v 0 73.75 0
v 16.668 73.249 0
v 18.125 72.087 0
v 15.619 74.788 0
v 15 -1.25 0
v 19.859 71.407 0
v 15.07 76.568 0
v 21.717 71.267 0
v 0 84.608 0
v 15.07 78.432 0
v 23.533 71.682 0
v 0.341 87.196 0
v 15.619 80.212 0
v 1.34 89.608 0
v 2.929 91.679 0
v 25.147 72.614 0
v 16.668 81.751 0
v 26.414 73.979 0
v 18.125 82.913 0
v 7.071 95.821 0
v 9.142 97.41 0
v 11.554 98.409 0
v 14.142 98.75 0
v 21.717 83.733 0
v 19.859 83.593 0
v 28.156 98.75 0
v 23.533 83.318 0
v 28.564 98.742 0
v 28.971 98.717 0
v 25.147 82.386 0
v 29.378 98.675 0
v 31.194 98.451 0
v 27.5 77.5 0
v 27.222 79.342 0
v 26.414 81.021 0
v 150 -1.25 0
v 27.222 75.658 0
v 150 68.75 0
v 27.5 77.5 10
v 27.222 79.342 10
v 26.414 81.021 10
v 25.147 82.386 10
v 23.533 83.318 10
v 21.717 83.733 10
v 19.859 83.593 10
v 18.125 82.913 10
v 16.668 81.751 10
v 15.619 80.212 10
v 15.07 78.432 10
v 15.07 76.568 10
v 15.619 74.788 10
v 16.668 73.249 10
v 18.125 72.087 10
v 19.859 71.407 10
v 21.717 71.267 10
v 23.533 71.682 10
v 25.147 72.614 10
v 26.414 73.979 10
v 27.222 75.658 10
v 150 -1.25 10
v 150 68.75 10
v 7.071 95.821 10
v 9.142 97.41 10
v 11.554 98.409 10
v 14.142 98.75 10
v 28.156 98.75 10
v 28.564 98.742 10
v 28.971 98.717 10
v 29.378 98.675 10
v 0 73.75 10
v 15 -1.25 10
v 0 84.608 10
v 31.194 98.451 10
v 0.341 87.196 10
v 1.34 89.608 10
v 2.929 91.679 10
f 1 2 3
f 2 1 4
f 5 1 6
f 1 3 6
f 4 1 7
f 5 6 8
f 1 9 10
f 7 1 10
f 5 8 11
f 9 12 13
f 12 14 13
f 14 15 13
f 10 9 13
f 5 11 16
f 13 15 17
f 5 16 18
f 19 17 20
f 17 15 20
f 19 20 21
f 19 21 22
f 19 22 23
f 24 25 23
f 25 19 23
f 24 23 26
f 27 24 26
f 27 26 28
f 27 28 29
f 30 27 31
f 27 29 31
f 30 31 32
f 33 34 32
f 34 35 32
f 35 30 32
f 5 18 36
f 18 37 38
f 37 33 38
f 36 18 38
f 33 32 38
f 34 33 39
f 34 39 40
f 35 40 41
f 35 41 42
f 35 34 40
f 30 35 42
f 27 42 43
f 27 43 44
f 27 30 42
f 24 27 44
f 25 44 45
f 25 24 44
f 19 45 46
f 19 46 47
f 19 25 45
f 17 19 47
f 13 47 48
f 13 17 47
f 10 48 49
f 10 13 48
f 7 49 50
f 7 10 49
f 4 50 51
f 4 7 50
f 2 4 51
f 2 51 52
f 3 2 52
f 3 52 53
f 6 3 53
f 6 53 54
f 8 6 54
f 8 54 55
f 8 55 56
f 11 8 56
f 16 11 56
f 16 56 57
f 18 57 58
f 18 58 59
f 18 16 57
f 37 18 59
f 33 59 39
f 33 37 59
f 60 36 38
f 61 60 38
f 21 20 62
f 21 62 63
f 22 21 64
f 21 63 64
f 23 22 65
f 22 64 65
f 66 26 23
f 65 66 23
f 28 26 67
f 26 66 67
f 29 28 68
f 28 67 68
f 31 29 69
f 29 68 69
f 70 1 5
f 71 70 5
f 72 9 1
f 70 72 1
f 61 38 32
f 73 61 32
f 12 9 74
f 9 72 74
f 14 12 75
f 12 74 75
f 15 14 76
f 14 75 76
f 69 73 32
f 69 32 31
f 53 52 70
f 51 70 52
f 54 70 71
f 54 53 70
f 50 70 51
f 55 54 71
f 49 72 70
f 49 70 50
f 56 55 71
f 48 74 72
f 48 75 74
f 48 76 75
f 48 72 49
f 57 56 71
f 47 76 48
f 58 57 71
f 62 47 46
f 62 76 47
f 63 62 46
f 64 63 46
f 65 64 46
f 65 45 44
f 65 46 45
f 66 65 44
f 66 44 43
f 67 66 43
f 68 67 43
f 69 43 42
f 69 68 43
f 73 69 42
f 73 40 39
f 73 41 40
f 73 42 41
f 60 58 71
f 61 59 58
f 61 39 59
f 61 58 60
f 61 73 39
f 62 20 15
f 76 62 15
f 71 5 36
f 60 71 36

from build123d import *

# Parameters (mm, degrees)
F0_R        = 6.25
F1_DEPTH    = 10
F2_T1_DEPTH = 18.1439634323
F2_T3_DEPTH = 61.4336597593
F3_R        = 10


# Not quite as in the source:
# - a fillet or chamfer that OpenCascade refuses, or shapes differently, is made with other operations: its cross-section is extruded or revolved along the edge and cut away or added
# - two fillets or chamfers of one size are made in one step


with BuildPart() as f1:
    # F0 (on Top) → F1 (new body)
    with BuildSketch(Plane.XY):
        Polygon((0, 73.75), (15, -1.25), (150, -1.25), (150, 68.75), (30, 98.75), (0, 98.75), align=None)
        with Locations((21.25, 77.5)):
            Circle(F0_R, mode=Mode.SUBTRACT)
    extrude(amount=F1_DEPTH)

    # F2: chamfer of 10 on 2 edges, made by hand

    # F2_s2 → F2_t1 (cut)
    with BuildSketch(Plane.XY.offset(-4.0719817161)):
        Polygon((31.1942999942, 98.4514250015), (28.7689437438, 98.75), (30, 98.75), align=None)
    extrude(amount=F2_T1_DEPTH, mode=Mode.SUBTRACT)

    # F2_s4 → F2_t3 (cut)
    with BuildSketch(Plane.XY.offset(-25.7168298797)):
        Polygon((10, 98.75), (0, 88.75), (0, 98.75), align=None)
    extrude(amount=F2_T3_DEPTH, mode=Mode.SUBTRACT)

    # F3
    f3_edges = [f1.edges().sort_by_distance(p)[0] for p in [
        (0, 88.75, 5),
        (10, 98.75, 5),
        (28.768944, 98.75, 5),
    ]]
    fillet(f3_edges, radius=F3_R)


solid = f1.part
